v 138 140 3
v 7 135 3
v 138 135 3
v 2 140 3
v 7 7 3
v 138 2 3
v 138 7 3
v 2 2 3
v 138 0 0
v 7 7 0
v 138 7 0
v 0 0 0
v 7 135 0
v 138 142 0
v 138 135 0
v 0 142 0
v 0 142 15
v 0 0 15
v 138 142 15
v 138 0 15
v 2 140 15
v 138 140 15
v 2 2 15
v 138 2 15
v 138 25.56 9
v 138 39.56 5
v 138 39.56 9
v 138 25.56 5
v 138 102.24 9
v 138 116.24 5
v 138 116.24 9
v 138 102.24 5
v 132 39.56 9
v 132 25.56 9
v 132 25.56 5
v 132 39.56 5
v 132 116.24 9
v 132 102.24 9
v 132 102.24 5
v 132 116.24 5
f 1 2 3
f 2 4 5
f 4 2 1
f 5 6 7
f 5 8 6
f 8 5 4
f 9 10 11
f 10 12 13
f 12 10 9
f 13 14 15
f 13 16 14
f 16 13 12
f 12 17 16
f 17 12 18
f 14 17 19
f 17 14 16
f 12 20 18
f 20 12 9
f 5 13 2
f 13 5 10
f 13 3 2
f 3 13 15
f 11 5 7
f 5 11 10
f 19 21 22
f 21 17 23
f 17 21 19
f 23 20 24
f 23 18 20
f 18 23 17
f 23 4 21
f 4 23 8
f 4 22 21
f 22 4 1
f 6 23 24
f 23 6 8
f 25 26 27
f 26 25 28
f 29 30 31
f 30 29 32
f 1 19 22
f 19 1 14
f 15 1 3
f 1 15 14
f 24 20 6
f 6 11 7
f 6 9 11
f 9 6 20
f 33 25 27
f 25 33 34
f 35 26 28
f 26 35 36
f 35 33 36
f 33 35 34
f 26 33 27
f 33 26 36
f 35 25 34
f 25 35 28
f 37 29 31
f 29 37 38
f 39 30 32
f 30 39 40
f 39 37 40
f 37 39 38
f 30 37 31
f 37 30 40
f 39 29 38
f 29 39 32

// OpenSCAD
half = "left"; // "left" or "right"
panel_cols = 64;
panel_rows = 32;
pixel_pitch = 4;
visible_border = 7;
face_thickness = 3;
rim_depth = 12;
rim_wall = 2;
split_overlap = 4;

panel_w = panel_cols * pixel_pitch;
panel_h = panel_rows * pixel_pitch;
outer_w = panel_w + visible_border * 2;
outer_h = panel_h + visible_border * 2;

module bezel_frame() {
  union() {
    difference() {
      cube([outer_w, outer_h, face_thickness], center = false);
      translate([visible_border, visible_border, -0.1])
        cube([panel_w, panel_h, face_thickness + 0.2], center = false);
    }

    difference() {
      translate([0, 0, face_thickness])
        cube([outer_w, outer_h, rim_depth], center = false);
      translate([rim_wall, rim_wall, face_thickness - 0.1])
        cube([outer_w - rim_wall * 2, outer_h - rim_wall * 2, rim_depth + 0.2], center = false);
    }
  }
}

module seam_tabs() {
  for (y = [outer_h * 0.18, outer_h * 0.72]) {
    translate([outer_w / 2 - 3, y, face_thickness + 2])
      cube([6, 14, 4], center = false);
  }
}

module half_mask(side = "left") {
  if (side == "left") {
    translate([-1, -1, -1])
      cube([outer_w / 2 + split_overlap, outer_h + 2, rim_depth + face_thickness + 2], center = false);
  } else {
    translate([outer_w / 2 - split_overlap, -1, -1])
      cube([outer_w / 2 + split_overlap + 1, outer_h + 2, rim_depth + face_thickness + 2], center = false);
  }
}

intersection() {
  union() {
    bezel_frame();
    // Male tabs only on the left half so the overlapping seam does not
    // solidify the same tabs twice when both halves are printed.
    if (half == "left") {
      seam_tabs();
    }
  }
  half_mask(half);
}
